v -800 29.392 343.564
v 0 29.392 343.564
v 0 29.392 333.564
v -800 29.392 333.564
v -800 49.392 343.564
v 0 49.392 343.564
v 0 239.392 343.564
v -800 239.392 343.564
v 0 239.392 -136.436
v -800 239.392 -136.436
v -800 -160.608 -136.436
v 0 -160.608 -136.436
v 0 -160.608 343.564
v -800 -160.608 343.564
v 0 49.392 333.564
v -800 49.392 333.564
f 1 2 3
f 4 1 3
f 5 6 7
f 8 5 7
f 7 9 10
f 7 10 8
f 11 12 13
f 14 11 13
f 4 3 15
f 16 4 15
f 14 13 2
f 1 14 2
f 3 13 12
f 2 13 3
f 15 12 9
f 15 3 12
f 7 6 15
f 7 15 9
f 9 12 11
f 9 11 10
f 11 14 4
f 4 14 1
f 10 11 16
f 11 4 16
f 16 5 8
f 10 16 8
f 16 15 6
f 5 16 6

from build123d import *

# Parameters (mm, degrees)
F0_W     = 400
F0_H     = 480
F1_DEPTH = 800
F3_DEPTH = 800


with BuildPart() as f1:
    # F0 (on Right) → F1 (new body)
    with BuildSketch(Plane.YZ):
        with Locations((39.391704, 103.56401)):
            Rectangle(F0_W, F0_H)
    extrude(amount=-F1_DEPTH)

    # F2 (on face) → F3 (cut)
    with BuildSketch(Plane.YZ):
        Polygon((39.391704, 343.56401), (29.391704, 343.56401), (29.391704, 333.56401), (49.391704, 333.56401), (49.391704, 343.56401), align=None)
    extrude(amount=-F3_DEPTH, mode=Mode.SUBTRACT)


solid = f1.part
